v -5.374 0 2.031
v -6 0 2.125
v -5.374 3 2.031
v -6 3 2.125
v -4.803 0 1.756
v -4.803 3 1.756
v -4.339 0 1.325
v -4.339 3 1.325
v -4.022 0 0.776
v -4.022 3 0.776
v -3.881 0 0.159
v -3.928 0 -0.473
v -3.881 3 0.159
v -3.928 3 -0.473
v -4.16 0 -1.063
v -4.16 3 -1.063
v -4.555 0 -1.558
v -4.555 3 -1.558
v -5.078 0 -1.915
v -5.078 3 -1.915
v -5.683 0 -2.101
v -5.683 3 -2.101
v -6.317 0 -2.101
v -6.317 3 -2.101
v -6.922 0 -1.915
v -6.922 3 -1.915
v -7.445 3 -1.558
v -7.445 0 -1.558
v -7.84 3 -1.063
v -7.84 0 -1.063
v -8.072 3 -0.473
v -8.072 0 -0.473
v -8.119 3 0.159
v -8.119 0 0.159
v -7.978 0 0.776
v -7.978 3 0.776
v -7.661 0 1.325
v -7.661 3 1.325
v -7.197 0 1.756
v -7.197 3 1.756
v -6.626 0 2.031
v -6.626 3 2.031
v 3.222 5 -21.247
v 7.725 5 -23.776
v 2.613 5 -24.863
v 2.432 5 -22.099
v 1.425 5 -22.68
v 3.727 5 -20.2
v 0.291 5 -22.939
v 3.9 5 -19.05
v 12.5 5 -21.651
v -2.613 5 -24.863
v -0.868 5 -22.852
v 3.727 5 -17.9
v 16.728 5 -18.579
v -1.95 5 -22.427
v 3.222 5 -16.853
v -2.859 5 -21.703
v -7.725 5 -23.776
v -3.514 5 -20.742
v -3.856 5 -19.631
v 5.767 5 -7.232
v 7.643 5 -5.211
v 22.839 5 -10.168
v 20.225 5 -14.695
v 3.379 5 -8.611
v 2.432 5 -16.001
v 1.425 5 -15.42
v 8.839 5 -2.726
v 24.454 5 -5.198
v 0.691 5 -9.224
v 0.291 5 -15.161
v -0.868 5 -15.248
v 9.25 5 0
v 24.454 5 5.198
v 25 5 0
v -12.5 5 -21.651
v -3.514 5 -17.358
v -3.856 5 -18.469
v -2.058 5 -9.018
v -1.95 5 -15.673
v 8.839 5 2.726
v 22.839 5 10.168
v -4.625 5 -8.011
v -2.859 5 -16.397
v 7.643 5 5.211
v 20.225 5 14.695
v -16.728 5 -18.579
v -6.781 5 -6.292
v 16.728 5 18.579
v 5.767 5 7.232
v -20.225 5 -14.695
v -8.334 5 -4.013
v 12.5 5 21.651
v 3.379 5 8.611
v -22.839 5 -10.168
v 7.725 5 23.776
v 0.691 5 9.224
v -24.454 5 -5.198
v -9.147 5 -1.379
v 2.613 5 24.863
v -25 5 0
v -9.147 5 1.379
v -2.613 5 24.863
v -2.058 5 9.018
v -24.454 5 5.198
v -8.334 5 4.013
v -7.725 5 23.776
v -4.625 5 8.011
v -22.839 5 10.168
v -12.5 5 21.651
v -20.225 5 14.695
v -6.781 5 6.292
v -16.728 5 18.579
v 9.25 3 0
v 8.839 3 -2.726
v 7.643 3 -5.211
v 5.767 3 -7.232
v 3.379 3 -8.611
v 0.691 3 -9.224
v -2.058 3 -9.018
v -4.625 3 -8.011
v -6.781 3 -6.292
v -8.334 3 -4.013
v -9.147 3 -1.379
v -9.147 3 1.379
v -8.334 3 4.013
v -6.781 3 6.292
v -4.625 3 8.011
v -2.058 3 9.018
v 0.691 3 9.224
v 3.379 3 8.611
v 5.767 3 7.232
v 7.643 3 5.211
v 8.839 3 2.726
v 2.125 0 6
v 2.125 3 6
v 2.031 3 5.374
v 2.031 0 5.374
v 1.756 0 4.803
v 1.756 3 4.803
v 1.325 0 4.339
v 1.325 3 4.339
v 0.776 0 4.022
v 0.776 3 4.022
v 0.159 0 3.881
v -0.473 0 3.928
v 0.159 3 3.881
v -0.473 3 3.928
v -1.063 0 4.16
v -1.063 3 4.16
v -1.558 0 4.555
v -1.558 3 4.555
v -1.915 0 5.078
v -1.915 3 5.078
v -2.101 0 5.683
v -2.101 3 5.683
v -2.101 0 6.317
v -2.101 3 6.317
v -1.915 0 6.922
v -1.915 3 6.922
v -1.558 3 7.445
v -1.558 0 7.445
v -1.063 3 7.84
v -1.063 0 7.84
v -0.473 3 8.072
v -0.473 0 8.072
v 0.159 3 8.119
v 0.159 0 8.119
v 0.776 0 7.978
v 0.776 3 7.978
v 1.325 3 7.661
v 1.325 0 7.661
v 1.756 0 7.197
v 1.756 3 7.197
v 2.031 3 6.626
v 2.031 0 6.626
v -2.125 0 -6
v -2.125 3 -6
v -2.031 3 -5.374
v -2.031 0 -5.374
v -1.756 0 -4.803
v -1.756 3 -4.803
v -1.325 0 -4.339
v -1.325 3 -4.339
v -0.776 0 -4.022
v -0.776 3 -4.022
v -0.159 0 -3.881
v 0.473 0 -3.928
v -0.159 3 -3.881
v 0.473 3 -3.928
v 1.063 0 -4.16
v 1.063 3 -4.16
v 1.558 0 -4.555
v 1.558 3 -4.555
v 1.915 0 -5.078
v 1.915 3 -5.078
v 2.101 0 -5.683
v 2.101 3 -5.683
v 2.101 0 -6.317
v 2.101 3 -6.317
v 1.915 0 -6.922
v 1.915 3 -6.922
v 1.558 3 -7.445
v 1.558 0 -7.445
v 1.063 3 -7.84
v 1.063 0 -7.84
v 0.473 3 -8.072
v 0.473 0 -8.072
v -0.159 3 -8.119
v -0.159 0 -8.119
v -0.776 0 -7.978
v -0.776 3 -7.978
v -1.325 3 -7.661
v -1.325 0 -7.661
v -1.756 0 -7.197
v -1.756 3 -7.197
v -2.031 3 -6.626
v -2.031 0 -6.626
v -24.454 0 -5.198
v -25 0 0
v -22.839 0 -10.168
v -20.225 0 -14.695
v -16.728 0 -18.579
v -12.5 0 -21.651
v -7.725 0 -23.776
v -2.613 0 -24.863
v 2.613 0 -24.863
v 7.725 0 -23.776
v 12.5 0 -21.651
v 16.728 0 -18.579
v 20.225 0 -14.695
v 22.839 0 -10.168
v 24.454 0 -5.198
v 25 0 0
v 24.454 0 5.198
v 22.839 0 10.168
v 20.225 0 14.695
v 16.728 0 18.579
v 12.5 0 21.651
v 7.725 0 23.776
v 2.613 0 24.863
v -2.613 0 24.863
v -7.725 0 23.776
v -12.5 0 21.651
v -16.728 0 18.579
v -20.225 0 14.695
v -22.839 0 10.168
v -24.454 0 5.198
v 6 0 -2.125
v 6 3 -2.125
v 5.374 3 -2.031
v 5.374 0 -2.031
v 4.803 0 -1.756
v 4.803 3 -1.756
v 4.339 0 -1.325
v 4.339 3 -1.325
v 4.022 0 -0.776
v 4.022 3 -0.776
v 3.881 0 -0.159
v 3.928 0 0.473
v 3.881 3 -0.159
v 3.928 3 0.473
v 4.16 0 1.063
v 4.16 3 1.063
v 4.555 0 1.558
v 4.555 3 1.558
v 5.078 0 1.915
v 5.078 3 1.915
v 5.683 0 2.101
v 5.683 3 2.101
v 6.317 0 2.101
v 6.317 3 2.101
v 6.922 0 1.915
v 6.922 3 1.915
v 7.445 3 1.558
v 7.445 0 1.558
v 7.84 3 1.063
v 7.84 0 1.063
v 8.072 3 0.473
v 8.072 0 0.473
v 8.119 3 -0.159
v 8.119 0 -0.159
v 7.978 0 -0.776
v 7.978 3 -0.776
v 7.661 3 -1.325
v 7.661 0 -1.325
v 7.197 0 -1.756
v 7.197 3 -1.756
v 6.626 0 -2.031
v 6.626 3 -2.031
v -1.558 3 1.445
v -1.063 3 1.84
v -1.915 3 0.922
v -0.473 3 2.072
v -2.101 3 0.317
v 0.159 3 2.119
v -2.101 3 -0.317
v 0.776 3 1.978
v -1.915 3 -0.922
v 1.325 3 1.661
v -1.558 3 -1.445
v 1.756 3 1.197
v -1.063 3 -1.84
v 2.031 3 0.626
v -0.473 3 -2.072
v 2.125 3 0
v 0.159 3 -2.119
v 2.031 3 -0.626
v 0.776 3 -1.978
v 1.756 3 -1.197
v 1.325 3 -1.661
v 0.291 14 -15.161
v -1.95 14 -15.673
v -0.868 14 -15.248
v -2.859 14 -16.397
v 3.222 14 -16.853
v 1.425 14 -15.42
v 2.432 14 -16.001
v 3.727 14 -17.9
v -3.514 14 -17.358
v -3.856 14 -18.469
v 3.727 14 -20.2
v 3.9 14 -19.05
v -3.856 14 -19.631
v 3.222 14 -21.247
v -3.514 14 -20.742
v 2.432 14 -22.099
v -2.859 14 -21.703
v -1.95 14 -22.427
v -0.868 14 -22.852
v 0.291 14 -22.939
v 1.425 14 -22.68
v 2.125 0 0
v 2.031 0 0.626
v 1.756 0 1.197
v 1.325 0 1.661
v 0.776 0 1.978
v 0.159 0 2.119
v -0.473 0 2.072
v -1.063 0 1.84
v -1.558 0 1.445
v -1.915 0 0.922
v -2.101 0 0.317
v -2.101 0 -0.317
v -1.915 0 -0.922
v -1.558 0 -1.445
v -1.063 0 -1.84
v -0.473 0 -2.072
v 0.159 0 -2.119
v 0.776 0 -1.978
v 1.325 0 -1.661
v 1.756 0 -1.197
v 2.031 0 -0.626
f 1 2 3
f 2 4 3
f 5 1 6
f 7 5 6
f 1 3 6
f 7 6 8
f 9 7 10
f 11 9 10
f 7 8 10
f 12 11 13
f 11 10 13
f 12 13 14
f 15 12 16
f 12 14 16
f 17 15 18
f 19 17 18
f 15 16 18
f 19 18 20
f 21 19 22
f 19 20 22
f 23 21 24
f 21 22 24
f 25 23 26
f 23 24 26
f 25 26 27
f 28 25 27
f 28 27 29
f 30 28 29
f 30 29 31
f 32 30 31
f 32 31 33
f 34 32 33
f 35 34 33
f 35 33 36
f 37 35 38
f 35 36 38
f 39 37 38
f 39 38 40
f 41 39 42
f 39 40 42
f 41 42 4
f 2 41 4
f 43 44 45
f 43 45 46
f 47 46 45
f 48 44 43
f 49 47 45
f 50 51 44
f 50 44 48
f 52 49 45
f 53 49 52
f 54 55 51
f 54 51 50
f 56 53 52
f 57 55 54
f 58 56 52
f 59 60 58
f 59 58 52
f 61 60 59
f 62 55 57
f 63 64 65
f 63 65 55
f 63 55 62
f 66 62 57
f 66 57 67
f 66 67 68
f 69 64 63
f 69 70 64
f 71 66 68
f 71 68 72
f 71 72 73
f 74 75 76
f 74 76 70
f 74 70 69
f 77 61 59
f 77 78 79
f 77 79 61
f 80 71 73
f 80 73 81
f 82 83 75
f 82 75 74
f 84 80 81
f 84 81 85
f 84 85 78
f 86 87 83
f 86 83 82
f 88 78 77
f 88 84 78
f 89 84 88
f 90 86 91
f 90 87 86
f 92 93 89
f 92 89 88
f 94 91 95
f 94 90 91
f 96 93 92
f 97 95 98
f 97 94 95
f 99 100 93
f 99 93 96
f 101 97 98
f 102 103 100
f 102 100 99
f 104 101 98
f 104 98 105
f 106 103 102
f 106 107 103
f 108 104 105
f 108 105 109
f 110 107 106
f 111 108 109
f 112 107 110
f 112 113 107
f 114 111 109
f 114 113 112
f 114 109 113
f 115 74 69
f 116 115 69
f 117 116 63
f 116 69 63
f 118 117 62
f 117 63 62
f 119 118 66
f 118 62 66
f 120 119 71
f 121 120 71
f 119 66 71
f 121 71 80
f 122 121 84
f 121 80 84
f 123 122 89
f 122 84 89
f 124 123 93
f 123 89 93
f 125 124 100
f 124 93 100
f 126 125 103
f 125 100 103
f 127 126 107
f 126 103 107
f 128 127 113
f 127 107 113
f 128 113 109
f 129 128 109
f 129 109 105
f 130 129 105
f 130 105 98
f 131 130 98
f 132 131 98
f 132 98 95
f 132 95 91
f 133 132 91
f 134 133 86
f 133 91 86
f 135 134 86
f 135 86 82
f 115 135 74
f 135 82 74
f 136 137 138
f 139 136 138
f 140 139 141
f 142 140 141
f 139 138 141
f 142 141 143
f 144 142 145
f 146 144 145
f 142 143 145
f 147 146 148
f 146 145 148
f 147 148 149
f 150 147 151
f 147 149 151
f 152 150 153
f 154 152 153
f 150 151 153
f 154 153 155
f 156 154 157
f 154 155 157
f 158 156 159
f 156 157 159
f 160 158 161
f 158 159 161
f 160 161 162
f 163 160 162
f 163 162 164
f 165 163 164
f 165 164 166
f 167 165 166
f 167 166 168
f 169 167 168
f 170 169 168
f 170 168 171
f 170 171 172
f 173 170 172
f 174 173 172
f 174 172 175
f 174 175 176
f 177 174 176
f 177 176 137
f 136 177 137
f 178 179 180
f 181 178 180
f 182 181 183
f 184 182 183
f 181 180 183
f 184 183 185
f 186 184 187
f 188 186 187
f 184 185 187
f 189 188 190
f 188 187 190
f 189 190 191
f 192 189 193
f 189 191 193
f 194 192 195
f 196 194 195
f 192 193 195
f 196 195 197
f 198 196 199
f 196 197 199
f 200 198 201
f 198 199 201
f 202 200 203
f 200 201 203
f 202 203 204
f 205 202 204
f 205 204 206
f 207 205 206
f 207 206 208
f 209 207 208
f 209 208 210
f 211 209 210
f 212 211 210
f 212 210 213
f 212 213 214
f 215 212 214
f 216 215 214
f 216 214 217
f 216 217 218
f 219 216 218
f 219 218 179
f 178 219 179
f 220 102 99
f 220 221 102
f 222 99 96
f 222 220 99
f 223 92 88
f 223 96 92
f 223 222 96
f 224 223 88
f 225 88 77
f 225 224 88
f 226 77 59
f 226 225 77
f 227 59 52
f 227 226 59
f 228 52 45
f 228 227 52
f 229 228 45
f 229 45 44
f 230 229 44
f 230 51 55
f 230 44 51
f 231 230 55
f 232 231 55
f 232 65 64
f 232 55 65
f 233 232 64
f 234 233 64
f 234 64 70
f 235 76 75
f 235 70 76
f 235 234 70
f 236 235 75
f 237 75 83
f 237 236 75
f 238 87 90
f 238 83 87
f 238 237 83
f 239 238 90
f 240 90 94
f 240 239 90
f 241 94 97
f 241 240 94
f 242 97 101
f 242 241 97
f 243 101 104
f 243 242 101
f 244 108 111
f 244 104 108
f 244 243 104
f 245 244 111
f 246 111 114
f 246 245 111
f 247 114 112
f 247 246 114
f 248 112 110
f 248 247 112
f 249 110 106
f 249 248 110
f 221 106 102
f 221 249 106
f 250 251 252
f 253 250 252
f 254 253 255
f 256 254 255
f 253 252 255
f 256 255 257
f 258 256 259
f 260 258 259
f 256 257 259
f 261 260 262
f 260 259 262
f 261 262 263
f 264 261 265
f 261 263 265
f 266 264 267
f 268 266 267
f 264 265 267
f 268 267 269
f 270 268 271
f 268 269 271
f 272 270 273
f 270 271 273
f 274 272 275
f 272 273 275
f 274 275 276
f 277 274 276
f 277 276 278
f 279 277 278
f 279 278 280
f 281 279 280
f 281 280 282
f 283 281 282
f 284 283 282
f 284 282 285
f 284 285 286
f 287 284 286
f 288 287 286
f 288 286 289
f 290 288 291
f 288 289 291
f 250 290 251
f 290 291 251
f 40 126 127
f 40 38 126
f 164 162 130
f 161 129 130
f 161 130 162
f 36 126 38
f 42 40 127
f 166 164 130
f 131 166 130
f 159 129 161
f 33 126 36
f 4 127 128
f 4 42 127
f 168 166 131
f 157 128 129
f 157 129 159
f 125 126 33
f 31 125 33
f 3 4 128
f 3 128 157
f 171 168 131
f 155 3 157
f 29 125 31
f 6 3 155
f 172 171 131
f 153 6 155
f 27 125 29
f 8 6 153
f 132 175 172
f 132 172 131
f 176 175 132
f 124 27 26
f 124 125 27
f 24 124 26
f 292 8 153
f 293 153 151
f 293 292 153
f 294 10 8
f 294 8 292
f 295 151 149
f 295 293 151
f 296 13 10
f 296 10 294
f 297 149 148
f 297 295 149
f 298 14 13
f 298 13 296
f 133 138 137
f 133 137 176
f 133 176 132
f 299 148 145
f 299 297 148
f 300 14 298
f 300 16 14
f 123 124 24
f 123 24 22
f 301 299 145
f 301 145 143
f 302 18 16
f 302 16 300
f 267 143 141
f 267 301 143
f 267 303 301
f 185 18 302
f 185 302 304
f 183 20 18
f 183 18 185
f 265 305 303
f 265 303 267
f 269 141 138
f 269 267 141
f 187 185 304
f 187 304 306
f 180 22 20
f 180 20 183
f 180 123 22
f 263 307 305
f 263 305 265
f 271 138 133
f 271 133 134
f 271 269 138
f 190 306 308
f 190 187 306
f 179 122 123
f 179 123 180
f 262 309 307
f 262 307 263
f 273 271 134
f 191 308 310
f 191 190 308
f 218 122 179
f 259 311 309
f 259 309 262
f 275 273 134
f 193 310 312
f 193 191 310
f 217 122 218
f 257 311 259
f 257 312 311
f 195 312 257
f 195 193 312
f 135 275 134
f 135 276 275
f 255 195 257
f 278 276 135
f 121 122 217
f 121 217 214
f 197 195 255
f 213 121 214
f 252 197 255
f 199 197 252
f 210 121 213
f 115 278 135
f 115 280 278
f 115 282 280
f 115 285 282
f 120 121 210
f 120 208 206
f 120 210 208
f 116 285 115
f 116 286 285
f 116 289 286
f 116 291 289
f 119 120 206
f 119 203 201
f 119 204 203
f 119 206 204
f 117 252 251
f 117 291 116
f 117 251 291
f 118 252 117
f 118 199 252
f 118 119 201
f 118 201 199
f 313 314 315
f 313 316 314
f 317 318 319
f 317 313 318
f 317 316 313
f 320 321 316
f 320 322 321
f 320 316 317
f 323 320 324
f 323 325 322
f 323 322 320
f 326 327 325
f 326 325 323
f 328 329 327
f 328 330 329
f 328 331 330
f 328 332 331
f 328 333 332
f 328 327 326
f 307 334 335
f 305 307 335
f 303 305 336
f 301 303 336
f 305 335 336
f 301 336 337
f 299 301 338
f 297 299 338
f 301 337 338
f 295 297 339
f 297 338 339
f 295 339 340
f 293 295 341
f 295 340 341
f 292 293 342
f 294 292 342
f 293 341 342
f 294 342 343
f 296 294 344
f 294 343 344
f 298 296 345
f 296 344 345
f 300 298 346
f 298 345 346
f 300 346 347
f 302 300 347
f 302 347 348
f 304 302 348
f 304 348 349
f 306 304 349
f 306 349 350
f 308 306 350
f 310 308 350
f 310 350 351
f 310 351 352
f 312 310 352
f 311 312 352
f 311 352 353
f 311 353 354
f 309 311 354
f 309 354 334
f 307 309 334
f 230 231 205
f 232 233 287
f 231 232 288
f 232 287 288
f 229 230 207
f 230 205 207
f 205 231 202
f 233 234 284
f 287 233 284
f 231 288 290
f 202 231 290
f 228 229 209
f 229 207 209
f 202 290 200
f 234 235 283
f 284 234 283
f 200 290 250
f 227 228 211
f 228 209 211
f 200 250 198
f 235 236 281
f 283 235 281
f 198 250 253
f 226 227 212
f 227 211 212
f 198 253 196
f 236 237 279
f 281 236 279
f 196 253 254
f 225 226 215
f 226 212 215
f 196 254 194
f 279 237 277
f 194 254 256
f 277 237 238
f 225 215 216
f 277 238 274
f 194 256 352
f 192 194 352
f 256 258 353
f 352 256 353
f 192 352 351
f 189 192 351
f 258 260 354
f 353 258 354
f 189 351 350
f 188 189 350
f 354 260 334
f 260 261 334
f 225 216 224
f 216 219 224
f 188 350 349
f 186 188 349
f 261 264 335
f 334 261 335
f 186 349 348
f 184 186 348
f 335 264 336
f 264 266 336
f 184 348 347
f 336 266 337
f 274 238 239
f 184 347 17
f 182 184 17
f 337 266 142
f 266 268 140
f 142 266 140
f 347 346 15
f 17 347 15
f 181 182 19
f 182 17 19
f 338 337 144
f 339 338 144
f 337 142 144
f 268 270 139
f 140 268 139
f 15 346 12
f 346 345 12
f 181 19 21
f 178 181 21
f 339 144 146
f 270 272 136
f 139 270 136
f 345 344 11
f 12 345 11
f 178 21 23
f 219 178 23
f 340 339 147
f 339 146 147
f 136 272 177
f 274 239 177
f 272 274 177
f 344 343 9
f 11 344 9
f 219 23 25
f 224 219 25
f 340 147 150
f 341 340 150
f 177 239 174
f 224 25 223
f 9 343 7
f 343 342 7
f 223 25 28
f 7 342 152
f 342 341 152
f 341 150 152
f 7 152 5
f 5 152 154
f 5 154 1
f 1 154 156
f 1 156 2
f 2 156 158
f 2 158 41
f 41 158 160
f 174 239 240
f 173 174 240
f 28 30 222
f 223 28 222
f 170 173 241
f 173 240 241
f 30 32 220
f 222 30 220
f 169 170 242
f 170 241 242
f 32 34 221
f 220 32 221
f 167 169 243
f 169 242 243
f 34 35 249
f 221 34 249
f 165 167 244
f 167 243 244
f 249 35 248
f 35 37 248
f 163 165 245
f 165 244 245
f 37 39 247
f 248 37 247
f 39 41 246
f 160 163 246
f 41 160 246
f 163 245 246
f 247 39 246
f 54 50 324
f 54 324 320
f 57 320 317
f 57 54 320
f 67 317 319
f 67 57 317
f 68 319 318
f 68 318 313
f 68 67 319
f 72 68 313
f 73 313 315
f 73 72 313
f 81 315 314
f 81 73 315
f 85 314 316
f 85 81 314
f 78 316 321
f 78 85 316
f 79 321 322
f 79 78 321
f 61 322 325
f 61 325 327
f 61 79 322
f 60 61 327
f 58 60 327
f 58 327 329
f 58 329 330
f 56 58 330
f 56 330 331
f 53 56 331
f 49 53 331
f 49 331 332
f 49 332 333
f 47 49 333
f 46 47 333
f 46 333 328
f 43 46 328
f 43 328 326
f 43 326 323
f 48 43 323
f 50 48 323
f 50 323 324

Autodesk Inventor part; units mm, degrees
ref_plane "YZ Plane" through (0, 0, 0) normal (1, 0, 0) x (0, 1, 0)
ref_plane "XZ Plane" through (0, 0, 0) normal (0, 1, 0) x (-1, 0, 0)
ref_plane "XY Plane" through (0, 0, 0) normal (0, 0, 1) x (1, 0, 0)
sketch "Sketch1" plane through (0, 0, 0) normal (0, 1, 0) x (-1, 0, 0)
  line L0 (0, 0) -> (0, -19.05)
  circle A0 centre (0, -19.05) radius 4
  circle A1 centre (0, 0) radius 25
  dimension "d0" = 19.05
  dimension "d1" = 8
  dimension "d2" = 50
extrude "Extrusion1" add sketch "Sketch1" along normal blind 5 contours A0 | A1
sketch "Sketch2" plane through (0, 5, 0) normal (0, 1, 0) x (1, 0, 0)
  line L0 (0, 0) -> (0, 19.05)
  circle A0 centre (0, 19.05) radius 3.9
  dimension "d5" = 19.05
  dimension "d6" = 7.8
extrude "Extrusion2" add sketch "Sketch2" along normal blind 9
sketch "Sketch4" plane through (0, 5, 0) normal (0, 1, 0) x (1, 0, 0)
  circle A0 centre (0, 0) radius 9.25
  dimension "d9" = 18.5
extrude "Extrusion3" cut sketch "Sketch4" against normal blind 2
sketch "Sketch5" plane through (0, 3, 0) normal (0, 1, 0) x (1, 0, 0)
  line L0 (0, 0) -> (0, -6)
  circle A0 centre (0, -6) radius 2.125
  dimension "d12" = 6
  dimension "d13" = 4.25
extrude "Extrusion4" cut sketch "Sketch5" against normal through all
pattern_circular "Circular Pattern1" count 4 over 360 about axis through (0, 0, 0) along (0, 1, 0) of "Extrusion4"
sketch "Sketch6" plane through (0, 0, 0) normal (0, -1, 0) x (1, 0, 0)
  circle A0 centre (0, 0) radius 9
  circle A1 centre (0, 0) radius 2.125
  dimension "d19" = 18
  dimension "d20" = 4.25
extrude "Extrusion5" cut sketch "Sketch6" against normal through all contours A1
sketch "Sketch7" plane through (0, 5, 0) normal (0, 1, 0) x (1, 0, 0)
  point P0 (0, 0)
properties part number "LegWheel"
